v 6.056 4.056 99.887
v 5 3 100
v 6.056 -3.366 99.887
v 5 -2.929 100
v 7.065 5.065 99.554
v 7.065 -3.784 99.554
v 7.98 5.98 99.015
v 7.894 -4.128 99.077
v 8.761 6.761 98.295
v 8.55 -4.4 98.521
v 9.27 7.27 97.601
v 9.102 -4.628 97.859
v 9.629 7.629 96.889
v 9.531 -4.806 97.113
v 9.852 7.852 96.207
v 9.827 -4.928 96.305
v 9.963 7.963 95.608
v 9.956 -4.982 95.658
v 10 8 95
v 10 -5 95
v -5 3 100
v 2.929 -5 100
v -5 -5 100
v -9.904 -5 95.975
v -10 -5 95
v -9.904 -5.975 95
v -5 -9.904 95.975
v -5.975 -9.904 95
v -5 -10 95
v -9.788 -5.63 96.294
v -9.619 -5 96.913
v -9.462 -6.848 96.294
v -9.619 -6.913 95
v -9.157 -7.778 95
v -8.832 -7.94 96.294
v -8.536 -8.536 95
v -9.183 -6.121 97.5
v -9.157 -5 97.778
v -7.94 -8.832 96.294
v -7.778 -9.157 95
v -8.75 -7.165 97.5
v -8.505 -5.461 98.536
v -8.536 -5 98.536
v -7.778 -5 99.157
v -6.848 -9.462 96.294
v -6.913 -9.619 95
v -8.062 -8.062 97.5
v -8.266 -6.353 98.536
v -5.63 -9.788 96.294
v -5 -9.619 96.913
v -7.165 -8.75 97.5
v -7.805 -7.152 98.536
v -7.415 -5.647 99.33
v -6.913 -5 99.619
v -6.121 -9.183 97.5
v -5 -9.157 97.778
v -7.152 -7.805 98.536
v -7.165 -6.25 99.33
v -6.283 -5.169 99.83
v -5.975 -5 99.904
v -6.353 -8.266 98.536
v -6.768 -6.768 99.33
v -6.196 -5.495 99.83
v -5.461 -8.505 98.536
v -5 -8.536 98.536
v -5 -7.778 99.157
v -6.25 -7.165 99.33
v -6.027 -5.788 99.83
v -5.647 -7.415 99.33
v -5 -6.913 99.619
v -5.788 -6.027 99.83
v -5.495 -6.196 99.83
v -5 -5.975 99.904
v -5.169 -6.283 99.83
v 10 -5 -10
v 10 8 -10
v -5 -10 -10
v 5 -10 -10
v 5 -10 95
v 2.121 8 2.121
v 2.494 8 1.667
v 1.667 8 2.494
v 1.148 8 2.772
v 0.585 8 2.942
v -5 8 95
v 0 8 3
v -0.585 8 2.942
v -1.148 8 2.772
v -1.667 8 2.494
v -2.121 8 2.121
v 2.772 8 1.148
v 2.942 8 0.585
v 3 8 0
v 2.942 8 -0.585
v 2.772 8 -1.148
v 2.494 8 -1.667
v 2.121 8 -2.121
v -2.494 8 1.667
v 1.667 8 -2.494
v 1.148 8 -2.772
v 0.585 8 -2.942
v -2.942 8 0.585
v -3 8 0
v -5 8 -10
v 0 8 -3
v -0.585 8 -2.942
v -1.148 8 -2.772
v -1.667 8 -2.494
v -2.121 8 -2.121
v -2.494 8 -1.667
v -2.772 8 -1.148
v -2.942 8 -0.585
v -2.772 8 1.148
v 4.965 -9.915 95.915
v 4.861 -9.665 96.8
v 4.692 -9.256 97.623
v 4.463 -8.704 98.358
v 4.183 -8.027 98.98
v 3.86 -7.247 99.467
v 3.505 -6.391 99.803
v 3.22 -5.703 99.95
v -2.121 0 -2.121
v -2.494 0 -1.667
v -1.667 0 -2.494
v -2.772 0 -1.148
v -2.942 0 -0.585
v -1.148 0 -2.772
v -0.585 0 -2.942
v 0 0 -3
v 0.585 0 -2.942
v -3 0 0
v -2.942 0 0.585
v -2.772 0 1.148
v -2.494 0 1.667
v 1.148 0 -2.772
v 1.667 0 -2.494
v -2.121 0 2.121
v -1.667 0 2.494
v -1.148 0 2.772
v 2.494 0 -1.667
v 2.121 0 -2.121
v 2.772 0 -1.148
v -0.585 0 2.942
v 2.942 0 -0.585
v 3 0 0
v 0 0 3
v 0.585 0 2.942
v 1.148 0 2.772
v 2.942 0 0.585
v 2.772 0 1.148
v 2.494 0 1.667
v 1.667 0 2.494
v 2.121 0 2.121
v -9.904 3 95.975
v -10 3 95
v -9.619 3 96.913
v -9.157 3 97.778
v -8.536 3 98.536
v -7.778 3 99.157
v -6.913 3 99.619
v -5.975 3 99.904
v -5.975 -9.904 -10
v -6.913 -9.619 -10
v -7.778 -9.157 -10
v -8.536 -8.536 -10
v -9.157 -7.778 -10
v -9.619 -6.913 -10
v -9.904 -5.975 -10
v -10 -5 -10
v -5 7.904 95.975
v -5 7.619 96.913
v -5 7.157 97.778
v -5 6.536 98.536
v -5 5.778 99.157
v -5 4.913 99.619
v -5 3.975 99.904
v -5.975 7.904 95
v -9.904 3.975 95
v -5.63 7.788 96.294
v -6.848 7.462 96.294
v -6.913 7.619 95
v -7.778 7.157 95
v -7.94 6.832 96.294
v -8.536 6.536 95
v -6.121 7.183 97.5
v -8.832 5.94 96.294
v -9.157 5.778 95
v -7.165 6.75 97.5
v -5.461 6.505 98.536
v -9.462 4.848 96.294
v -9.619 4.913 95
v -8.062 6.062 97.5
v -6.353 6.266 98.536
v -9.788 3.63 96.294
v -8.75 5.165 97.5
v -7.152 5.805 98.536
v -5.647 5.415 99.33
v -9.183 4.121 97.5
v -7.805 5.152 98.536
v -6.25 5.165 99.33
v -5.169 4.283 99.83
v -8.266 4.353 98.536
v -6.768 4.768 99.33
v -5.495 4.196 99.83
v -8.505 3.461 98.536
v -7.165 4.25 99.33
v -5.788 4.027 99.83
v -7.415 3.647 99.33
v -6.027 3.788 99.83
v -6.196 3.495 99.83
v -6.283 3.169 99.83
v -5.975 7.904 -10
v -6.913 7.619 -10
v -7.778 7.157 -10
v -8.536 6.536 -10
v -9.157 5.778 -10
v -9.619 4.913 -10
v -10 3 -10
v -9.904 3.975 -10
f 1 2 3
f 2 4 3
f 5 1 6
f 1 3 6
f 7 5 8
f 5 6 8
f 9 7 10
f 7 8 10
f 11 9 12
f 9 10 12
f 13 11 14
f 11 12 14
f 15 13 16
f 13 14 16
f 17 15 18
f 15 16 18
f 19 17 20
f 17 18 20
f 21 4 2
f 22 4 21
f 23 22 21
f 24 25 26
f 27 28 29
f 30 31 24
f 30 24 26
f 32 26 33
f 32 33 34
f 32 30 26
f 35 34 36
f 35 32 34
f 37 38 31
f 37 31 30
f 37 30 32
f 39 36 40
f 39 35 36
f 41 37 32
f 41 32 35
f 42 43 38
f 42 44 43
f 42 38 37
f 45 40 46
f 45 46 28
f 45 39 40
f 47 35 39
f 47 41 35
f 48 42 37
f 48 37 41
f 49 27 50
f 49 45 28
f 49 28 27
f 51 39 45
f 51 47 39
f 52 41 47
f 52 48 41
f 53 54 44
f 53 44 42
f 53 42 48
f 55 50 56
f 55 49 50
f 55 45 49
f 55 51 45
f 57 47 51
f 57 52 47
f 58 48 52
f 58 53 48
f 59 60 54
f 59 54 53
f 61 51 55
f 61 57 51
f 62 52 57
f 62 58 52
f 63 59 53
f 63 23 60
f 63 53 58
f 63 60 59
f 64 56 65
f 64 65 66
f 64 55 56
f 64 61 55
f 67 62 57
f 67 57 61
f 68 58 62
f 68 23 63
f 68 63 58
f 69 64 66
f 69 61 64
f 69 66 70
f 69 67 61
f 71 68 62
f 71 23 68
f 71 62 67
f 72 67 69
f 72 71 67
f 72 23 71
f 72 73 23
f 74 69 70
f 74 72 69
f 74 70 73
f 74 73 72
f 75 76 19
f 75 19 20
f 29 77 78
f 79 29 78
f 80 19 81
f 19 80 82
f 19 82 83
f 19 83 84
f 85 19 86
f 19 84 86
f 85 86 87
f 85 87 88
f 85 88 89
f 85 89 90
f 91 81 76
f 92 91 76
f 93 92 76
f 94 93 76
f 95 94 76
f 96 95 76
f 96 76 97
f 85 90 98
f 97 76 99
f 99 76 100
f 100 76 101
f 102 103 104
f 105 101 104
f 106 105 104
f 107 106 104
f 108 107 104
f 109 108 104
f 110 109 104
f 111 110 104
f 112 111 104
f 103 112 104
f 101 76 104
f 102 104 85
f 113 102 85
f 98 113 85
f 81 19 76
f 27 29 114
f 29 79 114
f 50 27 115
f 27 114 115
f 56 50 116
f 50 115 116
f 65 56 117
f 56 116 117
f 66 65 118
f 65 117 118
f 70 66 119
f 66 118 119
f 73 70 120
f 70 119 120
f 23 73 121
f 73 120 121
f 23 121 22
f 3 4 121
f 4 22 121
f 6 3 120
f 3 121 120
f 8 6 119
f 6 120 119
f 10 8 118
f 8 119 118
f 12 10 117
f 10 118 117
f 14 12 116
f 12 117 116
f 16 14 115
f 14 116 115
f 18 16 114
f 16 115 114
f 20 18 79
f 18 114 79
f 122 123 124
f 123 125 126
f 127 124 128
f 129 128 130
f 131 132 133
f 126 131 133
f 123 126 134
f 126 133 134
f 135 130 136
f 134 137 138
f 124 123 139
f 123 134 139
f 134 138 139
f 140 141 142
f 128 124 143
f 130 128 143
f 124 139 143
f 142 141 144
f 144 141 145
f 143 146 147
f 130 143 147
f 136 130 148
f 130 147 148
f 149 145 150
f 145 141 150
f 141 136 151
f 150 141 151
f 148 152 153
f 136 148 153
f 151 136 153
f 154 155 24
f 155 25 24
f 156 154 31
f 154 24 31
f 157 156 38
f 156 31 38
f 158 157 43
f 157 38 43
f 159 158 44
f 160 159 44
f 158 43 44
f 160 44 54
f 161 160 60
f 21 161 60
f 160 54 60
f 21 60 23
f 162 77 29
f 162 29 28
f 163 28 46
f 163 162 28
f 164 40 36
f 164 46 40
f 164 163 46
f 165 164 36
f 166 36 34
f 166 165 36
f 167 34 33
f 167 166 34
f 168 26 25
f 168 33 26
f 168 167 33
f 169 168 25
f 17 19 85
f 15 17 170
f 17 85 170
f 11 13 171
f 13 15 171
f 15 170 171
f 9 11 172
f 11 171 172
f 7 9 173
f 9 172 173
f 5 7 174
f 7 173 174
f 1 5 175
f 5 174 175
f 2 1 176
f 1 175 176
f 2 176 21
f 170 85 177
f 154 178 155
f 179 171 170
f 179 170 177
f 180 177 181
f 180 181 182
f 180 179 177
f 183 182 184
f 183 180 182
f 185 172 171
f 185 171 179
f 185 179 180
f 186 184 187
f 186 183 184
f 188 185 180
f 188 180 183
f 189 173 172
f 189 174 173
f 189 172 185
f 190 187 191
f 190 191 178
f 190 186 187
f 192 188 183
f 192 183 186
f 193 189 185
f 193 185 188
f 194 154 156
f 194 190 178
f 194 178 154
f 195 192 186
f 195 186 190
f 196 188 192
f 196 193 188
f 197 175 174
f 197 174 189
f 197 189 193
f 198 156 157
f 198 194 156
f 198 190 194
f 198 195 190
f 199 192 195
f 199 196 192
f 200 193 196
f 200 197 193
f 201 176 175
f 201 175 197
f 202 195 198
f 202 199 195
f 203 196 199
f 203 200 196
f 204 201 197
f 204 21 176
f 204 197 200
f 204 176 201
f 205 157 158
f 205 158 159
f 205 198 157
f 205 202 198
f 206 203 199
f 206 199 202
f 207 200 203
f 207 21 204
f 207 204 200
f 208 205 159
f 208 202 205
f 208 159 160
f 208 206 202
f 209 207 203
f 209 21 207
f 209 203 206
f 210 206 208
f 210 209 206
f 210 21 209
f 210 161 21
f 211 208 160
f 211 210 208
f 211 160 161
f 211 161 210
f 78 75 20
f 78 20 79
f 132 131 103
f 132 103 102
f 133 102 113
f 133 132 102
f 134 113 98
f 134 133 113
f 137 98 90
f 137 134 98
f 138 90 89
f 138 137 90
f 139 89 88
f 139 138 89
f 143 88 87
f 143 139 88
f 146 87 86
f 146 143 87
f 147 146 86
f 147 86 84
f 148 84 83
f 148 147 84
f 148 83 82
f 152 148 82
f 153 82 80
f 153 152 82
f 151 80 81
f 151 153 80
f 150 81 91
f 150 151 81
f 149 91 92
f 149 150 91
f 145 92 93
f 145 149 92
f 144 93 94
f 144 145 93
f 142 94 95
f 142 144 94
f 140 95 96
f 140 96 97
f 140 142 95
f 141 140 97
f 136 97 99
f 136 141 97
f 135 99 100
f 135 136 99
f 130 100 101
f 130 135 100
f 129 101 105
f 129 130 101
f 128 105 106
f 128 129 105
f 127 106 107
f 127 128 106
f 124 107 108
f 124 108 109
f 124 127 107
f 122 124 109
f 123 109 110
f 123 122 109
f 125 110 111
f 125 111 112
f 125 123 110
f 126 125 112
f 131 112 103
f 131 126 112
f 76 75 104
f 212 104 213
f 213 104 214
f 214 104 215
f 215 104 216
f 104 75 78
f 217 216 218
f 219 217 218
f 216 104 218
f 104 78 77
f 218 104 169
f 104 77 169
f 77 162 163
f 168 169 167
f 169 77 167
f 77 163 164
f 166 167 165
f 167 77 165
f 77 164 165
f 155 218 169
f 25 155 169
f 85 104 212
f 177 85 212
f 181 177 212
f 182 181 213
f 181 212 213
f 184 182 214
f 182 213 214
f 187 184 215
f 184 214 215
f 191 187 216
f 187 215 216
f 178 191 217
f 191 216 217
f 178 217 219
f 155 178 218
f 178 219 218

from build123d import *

# Parameters (mm, degrees)
F0_W     = 20
F0_H     = 100
F1_DEPTH = 10
F2_W     = 20
F2_H     = 100
F2_R     = 3
F3_DEPTH = 8
F4_SIZE  = 5
F5_R     = 5
F6_DEPTH = 10
F7_R     = 5


with BuildPart() as f1:
    # F0 (on Front) → F1 (new body)
    with BuildSketch(Plane.XZ):
        with Locations((0, 40)):
            Rectangle(F0_W, F0_H)
    extrude(amount=F1_DEPTH)

    # F2 (on face) → F3 (join)
    with BuildSketch(Plane(origin=(0, 0, 0), x_dir=(-1, 0, 0), z_dir=(0, 1, 0))):
        with Locations((0, 40)):
            Rectangle(F2_W, F2_H)
        Circle(F2_R, mode=Mode.SUBTRACT)
    extrude(amount=F3_DEPTH)

    # F4
    f4_edges = [f1.edges().sort_by_distance(p)[0] for p in [
        (10, -10, 40),
    ]]
    chamfer(f4_edges, length=F4_SIZE)

    # F5
    f5_edges = [f1.edges().sort_by_distance(p)[0] for p in [
        (-10, -10, 40),
        (-10, 8, 40),
    ]]
    fillet(f5_edges, radius=F5_R)

    # F6 (add): a face of the model
    f6_faces = [f1.faces().sort_by_distance(p)[0] for p in [
        (-0.0262777066, -0.7278062427, 90),
    ]]
    extrude(f6_faces, amount=F6_DEPTH)

    # F7
    f7_edges = [f1.edges().sort_by_distance(p)[0] for p in [
        (10, 1.5, 100),
        (2.5, 8, 100),
        (-10, -1, 100),
        (7.5, -7.5, 100),
        (-8.535534, -8.535534, 100),
        (0, -10, 100),
        (-8.535534, 6.535534, 100),
    ]]
    fillet(f7_edges, radius=F7_R)


solid = f1.part
